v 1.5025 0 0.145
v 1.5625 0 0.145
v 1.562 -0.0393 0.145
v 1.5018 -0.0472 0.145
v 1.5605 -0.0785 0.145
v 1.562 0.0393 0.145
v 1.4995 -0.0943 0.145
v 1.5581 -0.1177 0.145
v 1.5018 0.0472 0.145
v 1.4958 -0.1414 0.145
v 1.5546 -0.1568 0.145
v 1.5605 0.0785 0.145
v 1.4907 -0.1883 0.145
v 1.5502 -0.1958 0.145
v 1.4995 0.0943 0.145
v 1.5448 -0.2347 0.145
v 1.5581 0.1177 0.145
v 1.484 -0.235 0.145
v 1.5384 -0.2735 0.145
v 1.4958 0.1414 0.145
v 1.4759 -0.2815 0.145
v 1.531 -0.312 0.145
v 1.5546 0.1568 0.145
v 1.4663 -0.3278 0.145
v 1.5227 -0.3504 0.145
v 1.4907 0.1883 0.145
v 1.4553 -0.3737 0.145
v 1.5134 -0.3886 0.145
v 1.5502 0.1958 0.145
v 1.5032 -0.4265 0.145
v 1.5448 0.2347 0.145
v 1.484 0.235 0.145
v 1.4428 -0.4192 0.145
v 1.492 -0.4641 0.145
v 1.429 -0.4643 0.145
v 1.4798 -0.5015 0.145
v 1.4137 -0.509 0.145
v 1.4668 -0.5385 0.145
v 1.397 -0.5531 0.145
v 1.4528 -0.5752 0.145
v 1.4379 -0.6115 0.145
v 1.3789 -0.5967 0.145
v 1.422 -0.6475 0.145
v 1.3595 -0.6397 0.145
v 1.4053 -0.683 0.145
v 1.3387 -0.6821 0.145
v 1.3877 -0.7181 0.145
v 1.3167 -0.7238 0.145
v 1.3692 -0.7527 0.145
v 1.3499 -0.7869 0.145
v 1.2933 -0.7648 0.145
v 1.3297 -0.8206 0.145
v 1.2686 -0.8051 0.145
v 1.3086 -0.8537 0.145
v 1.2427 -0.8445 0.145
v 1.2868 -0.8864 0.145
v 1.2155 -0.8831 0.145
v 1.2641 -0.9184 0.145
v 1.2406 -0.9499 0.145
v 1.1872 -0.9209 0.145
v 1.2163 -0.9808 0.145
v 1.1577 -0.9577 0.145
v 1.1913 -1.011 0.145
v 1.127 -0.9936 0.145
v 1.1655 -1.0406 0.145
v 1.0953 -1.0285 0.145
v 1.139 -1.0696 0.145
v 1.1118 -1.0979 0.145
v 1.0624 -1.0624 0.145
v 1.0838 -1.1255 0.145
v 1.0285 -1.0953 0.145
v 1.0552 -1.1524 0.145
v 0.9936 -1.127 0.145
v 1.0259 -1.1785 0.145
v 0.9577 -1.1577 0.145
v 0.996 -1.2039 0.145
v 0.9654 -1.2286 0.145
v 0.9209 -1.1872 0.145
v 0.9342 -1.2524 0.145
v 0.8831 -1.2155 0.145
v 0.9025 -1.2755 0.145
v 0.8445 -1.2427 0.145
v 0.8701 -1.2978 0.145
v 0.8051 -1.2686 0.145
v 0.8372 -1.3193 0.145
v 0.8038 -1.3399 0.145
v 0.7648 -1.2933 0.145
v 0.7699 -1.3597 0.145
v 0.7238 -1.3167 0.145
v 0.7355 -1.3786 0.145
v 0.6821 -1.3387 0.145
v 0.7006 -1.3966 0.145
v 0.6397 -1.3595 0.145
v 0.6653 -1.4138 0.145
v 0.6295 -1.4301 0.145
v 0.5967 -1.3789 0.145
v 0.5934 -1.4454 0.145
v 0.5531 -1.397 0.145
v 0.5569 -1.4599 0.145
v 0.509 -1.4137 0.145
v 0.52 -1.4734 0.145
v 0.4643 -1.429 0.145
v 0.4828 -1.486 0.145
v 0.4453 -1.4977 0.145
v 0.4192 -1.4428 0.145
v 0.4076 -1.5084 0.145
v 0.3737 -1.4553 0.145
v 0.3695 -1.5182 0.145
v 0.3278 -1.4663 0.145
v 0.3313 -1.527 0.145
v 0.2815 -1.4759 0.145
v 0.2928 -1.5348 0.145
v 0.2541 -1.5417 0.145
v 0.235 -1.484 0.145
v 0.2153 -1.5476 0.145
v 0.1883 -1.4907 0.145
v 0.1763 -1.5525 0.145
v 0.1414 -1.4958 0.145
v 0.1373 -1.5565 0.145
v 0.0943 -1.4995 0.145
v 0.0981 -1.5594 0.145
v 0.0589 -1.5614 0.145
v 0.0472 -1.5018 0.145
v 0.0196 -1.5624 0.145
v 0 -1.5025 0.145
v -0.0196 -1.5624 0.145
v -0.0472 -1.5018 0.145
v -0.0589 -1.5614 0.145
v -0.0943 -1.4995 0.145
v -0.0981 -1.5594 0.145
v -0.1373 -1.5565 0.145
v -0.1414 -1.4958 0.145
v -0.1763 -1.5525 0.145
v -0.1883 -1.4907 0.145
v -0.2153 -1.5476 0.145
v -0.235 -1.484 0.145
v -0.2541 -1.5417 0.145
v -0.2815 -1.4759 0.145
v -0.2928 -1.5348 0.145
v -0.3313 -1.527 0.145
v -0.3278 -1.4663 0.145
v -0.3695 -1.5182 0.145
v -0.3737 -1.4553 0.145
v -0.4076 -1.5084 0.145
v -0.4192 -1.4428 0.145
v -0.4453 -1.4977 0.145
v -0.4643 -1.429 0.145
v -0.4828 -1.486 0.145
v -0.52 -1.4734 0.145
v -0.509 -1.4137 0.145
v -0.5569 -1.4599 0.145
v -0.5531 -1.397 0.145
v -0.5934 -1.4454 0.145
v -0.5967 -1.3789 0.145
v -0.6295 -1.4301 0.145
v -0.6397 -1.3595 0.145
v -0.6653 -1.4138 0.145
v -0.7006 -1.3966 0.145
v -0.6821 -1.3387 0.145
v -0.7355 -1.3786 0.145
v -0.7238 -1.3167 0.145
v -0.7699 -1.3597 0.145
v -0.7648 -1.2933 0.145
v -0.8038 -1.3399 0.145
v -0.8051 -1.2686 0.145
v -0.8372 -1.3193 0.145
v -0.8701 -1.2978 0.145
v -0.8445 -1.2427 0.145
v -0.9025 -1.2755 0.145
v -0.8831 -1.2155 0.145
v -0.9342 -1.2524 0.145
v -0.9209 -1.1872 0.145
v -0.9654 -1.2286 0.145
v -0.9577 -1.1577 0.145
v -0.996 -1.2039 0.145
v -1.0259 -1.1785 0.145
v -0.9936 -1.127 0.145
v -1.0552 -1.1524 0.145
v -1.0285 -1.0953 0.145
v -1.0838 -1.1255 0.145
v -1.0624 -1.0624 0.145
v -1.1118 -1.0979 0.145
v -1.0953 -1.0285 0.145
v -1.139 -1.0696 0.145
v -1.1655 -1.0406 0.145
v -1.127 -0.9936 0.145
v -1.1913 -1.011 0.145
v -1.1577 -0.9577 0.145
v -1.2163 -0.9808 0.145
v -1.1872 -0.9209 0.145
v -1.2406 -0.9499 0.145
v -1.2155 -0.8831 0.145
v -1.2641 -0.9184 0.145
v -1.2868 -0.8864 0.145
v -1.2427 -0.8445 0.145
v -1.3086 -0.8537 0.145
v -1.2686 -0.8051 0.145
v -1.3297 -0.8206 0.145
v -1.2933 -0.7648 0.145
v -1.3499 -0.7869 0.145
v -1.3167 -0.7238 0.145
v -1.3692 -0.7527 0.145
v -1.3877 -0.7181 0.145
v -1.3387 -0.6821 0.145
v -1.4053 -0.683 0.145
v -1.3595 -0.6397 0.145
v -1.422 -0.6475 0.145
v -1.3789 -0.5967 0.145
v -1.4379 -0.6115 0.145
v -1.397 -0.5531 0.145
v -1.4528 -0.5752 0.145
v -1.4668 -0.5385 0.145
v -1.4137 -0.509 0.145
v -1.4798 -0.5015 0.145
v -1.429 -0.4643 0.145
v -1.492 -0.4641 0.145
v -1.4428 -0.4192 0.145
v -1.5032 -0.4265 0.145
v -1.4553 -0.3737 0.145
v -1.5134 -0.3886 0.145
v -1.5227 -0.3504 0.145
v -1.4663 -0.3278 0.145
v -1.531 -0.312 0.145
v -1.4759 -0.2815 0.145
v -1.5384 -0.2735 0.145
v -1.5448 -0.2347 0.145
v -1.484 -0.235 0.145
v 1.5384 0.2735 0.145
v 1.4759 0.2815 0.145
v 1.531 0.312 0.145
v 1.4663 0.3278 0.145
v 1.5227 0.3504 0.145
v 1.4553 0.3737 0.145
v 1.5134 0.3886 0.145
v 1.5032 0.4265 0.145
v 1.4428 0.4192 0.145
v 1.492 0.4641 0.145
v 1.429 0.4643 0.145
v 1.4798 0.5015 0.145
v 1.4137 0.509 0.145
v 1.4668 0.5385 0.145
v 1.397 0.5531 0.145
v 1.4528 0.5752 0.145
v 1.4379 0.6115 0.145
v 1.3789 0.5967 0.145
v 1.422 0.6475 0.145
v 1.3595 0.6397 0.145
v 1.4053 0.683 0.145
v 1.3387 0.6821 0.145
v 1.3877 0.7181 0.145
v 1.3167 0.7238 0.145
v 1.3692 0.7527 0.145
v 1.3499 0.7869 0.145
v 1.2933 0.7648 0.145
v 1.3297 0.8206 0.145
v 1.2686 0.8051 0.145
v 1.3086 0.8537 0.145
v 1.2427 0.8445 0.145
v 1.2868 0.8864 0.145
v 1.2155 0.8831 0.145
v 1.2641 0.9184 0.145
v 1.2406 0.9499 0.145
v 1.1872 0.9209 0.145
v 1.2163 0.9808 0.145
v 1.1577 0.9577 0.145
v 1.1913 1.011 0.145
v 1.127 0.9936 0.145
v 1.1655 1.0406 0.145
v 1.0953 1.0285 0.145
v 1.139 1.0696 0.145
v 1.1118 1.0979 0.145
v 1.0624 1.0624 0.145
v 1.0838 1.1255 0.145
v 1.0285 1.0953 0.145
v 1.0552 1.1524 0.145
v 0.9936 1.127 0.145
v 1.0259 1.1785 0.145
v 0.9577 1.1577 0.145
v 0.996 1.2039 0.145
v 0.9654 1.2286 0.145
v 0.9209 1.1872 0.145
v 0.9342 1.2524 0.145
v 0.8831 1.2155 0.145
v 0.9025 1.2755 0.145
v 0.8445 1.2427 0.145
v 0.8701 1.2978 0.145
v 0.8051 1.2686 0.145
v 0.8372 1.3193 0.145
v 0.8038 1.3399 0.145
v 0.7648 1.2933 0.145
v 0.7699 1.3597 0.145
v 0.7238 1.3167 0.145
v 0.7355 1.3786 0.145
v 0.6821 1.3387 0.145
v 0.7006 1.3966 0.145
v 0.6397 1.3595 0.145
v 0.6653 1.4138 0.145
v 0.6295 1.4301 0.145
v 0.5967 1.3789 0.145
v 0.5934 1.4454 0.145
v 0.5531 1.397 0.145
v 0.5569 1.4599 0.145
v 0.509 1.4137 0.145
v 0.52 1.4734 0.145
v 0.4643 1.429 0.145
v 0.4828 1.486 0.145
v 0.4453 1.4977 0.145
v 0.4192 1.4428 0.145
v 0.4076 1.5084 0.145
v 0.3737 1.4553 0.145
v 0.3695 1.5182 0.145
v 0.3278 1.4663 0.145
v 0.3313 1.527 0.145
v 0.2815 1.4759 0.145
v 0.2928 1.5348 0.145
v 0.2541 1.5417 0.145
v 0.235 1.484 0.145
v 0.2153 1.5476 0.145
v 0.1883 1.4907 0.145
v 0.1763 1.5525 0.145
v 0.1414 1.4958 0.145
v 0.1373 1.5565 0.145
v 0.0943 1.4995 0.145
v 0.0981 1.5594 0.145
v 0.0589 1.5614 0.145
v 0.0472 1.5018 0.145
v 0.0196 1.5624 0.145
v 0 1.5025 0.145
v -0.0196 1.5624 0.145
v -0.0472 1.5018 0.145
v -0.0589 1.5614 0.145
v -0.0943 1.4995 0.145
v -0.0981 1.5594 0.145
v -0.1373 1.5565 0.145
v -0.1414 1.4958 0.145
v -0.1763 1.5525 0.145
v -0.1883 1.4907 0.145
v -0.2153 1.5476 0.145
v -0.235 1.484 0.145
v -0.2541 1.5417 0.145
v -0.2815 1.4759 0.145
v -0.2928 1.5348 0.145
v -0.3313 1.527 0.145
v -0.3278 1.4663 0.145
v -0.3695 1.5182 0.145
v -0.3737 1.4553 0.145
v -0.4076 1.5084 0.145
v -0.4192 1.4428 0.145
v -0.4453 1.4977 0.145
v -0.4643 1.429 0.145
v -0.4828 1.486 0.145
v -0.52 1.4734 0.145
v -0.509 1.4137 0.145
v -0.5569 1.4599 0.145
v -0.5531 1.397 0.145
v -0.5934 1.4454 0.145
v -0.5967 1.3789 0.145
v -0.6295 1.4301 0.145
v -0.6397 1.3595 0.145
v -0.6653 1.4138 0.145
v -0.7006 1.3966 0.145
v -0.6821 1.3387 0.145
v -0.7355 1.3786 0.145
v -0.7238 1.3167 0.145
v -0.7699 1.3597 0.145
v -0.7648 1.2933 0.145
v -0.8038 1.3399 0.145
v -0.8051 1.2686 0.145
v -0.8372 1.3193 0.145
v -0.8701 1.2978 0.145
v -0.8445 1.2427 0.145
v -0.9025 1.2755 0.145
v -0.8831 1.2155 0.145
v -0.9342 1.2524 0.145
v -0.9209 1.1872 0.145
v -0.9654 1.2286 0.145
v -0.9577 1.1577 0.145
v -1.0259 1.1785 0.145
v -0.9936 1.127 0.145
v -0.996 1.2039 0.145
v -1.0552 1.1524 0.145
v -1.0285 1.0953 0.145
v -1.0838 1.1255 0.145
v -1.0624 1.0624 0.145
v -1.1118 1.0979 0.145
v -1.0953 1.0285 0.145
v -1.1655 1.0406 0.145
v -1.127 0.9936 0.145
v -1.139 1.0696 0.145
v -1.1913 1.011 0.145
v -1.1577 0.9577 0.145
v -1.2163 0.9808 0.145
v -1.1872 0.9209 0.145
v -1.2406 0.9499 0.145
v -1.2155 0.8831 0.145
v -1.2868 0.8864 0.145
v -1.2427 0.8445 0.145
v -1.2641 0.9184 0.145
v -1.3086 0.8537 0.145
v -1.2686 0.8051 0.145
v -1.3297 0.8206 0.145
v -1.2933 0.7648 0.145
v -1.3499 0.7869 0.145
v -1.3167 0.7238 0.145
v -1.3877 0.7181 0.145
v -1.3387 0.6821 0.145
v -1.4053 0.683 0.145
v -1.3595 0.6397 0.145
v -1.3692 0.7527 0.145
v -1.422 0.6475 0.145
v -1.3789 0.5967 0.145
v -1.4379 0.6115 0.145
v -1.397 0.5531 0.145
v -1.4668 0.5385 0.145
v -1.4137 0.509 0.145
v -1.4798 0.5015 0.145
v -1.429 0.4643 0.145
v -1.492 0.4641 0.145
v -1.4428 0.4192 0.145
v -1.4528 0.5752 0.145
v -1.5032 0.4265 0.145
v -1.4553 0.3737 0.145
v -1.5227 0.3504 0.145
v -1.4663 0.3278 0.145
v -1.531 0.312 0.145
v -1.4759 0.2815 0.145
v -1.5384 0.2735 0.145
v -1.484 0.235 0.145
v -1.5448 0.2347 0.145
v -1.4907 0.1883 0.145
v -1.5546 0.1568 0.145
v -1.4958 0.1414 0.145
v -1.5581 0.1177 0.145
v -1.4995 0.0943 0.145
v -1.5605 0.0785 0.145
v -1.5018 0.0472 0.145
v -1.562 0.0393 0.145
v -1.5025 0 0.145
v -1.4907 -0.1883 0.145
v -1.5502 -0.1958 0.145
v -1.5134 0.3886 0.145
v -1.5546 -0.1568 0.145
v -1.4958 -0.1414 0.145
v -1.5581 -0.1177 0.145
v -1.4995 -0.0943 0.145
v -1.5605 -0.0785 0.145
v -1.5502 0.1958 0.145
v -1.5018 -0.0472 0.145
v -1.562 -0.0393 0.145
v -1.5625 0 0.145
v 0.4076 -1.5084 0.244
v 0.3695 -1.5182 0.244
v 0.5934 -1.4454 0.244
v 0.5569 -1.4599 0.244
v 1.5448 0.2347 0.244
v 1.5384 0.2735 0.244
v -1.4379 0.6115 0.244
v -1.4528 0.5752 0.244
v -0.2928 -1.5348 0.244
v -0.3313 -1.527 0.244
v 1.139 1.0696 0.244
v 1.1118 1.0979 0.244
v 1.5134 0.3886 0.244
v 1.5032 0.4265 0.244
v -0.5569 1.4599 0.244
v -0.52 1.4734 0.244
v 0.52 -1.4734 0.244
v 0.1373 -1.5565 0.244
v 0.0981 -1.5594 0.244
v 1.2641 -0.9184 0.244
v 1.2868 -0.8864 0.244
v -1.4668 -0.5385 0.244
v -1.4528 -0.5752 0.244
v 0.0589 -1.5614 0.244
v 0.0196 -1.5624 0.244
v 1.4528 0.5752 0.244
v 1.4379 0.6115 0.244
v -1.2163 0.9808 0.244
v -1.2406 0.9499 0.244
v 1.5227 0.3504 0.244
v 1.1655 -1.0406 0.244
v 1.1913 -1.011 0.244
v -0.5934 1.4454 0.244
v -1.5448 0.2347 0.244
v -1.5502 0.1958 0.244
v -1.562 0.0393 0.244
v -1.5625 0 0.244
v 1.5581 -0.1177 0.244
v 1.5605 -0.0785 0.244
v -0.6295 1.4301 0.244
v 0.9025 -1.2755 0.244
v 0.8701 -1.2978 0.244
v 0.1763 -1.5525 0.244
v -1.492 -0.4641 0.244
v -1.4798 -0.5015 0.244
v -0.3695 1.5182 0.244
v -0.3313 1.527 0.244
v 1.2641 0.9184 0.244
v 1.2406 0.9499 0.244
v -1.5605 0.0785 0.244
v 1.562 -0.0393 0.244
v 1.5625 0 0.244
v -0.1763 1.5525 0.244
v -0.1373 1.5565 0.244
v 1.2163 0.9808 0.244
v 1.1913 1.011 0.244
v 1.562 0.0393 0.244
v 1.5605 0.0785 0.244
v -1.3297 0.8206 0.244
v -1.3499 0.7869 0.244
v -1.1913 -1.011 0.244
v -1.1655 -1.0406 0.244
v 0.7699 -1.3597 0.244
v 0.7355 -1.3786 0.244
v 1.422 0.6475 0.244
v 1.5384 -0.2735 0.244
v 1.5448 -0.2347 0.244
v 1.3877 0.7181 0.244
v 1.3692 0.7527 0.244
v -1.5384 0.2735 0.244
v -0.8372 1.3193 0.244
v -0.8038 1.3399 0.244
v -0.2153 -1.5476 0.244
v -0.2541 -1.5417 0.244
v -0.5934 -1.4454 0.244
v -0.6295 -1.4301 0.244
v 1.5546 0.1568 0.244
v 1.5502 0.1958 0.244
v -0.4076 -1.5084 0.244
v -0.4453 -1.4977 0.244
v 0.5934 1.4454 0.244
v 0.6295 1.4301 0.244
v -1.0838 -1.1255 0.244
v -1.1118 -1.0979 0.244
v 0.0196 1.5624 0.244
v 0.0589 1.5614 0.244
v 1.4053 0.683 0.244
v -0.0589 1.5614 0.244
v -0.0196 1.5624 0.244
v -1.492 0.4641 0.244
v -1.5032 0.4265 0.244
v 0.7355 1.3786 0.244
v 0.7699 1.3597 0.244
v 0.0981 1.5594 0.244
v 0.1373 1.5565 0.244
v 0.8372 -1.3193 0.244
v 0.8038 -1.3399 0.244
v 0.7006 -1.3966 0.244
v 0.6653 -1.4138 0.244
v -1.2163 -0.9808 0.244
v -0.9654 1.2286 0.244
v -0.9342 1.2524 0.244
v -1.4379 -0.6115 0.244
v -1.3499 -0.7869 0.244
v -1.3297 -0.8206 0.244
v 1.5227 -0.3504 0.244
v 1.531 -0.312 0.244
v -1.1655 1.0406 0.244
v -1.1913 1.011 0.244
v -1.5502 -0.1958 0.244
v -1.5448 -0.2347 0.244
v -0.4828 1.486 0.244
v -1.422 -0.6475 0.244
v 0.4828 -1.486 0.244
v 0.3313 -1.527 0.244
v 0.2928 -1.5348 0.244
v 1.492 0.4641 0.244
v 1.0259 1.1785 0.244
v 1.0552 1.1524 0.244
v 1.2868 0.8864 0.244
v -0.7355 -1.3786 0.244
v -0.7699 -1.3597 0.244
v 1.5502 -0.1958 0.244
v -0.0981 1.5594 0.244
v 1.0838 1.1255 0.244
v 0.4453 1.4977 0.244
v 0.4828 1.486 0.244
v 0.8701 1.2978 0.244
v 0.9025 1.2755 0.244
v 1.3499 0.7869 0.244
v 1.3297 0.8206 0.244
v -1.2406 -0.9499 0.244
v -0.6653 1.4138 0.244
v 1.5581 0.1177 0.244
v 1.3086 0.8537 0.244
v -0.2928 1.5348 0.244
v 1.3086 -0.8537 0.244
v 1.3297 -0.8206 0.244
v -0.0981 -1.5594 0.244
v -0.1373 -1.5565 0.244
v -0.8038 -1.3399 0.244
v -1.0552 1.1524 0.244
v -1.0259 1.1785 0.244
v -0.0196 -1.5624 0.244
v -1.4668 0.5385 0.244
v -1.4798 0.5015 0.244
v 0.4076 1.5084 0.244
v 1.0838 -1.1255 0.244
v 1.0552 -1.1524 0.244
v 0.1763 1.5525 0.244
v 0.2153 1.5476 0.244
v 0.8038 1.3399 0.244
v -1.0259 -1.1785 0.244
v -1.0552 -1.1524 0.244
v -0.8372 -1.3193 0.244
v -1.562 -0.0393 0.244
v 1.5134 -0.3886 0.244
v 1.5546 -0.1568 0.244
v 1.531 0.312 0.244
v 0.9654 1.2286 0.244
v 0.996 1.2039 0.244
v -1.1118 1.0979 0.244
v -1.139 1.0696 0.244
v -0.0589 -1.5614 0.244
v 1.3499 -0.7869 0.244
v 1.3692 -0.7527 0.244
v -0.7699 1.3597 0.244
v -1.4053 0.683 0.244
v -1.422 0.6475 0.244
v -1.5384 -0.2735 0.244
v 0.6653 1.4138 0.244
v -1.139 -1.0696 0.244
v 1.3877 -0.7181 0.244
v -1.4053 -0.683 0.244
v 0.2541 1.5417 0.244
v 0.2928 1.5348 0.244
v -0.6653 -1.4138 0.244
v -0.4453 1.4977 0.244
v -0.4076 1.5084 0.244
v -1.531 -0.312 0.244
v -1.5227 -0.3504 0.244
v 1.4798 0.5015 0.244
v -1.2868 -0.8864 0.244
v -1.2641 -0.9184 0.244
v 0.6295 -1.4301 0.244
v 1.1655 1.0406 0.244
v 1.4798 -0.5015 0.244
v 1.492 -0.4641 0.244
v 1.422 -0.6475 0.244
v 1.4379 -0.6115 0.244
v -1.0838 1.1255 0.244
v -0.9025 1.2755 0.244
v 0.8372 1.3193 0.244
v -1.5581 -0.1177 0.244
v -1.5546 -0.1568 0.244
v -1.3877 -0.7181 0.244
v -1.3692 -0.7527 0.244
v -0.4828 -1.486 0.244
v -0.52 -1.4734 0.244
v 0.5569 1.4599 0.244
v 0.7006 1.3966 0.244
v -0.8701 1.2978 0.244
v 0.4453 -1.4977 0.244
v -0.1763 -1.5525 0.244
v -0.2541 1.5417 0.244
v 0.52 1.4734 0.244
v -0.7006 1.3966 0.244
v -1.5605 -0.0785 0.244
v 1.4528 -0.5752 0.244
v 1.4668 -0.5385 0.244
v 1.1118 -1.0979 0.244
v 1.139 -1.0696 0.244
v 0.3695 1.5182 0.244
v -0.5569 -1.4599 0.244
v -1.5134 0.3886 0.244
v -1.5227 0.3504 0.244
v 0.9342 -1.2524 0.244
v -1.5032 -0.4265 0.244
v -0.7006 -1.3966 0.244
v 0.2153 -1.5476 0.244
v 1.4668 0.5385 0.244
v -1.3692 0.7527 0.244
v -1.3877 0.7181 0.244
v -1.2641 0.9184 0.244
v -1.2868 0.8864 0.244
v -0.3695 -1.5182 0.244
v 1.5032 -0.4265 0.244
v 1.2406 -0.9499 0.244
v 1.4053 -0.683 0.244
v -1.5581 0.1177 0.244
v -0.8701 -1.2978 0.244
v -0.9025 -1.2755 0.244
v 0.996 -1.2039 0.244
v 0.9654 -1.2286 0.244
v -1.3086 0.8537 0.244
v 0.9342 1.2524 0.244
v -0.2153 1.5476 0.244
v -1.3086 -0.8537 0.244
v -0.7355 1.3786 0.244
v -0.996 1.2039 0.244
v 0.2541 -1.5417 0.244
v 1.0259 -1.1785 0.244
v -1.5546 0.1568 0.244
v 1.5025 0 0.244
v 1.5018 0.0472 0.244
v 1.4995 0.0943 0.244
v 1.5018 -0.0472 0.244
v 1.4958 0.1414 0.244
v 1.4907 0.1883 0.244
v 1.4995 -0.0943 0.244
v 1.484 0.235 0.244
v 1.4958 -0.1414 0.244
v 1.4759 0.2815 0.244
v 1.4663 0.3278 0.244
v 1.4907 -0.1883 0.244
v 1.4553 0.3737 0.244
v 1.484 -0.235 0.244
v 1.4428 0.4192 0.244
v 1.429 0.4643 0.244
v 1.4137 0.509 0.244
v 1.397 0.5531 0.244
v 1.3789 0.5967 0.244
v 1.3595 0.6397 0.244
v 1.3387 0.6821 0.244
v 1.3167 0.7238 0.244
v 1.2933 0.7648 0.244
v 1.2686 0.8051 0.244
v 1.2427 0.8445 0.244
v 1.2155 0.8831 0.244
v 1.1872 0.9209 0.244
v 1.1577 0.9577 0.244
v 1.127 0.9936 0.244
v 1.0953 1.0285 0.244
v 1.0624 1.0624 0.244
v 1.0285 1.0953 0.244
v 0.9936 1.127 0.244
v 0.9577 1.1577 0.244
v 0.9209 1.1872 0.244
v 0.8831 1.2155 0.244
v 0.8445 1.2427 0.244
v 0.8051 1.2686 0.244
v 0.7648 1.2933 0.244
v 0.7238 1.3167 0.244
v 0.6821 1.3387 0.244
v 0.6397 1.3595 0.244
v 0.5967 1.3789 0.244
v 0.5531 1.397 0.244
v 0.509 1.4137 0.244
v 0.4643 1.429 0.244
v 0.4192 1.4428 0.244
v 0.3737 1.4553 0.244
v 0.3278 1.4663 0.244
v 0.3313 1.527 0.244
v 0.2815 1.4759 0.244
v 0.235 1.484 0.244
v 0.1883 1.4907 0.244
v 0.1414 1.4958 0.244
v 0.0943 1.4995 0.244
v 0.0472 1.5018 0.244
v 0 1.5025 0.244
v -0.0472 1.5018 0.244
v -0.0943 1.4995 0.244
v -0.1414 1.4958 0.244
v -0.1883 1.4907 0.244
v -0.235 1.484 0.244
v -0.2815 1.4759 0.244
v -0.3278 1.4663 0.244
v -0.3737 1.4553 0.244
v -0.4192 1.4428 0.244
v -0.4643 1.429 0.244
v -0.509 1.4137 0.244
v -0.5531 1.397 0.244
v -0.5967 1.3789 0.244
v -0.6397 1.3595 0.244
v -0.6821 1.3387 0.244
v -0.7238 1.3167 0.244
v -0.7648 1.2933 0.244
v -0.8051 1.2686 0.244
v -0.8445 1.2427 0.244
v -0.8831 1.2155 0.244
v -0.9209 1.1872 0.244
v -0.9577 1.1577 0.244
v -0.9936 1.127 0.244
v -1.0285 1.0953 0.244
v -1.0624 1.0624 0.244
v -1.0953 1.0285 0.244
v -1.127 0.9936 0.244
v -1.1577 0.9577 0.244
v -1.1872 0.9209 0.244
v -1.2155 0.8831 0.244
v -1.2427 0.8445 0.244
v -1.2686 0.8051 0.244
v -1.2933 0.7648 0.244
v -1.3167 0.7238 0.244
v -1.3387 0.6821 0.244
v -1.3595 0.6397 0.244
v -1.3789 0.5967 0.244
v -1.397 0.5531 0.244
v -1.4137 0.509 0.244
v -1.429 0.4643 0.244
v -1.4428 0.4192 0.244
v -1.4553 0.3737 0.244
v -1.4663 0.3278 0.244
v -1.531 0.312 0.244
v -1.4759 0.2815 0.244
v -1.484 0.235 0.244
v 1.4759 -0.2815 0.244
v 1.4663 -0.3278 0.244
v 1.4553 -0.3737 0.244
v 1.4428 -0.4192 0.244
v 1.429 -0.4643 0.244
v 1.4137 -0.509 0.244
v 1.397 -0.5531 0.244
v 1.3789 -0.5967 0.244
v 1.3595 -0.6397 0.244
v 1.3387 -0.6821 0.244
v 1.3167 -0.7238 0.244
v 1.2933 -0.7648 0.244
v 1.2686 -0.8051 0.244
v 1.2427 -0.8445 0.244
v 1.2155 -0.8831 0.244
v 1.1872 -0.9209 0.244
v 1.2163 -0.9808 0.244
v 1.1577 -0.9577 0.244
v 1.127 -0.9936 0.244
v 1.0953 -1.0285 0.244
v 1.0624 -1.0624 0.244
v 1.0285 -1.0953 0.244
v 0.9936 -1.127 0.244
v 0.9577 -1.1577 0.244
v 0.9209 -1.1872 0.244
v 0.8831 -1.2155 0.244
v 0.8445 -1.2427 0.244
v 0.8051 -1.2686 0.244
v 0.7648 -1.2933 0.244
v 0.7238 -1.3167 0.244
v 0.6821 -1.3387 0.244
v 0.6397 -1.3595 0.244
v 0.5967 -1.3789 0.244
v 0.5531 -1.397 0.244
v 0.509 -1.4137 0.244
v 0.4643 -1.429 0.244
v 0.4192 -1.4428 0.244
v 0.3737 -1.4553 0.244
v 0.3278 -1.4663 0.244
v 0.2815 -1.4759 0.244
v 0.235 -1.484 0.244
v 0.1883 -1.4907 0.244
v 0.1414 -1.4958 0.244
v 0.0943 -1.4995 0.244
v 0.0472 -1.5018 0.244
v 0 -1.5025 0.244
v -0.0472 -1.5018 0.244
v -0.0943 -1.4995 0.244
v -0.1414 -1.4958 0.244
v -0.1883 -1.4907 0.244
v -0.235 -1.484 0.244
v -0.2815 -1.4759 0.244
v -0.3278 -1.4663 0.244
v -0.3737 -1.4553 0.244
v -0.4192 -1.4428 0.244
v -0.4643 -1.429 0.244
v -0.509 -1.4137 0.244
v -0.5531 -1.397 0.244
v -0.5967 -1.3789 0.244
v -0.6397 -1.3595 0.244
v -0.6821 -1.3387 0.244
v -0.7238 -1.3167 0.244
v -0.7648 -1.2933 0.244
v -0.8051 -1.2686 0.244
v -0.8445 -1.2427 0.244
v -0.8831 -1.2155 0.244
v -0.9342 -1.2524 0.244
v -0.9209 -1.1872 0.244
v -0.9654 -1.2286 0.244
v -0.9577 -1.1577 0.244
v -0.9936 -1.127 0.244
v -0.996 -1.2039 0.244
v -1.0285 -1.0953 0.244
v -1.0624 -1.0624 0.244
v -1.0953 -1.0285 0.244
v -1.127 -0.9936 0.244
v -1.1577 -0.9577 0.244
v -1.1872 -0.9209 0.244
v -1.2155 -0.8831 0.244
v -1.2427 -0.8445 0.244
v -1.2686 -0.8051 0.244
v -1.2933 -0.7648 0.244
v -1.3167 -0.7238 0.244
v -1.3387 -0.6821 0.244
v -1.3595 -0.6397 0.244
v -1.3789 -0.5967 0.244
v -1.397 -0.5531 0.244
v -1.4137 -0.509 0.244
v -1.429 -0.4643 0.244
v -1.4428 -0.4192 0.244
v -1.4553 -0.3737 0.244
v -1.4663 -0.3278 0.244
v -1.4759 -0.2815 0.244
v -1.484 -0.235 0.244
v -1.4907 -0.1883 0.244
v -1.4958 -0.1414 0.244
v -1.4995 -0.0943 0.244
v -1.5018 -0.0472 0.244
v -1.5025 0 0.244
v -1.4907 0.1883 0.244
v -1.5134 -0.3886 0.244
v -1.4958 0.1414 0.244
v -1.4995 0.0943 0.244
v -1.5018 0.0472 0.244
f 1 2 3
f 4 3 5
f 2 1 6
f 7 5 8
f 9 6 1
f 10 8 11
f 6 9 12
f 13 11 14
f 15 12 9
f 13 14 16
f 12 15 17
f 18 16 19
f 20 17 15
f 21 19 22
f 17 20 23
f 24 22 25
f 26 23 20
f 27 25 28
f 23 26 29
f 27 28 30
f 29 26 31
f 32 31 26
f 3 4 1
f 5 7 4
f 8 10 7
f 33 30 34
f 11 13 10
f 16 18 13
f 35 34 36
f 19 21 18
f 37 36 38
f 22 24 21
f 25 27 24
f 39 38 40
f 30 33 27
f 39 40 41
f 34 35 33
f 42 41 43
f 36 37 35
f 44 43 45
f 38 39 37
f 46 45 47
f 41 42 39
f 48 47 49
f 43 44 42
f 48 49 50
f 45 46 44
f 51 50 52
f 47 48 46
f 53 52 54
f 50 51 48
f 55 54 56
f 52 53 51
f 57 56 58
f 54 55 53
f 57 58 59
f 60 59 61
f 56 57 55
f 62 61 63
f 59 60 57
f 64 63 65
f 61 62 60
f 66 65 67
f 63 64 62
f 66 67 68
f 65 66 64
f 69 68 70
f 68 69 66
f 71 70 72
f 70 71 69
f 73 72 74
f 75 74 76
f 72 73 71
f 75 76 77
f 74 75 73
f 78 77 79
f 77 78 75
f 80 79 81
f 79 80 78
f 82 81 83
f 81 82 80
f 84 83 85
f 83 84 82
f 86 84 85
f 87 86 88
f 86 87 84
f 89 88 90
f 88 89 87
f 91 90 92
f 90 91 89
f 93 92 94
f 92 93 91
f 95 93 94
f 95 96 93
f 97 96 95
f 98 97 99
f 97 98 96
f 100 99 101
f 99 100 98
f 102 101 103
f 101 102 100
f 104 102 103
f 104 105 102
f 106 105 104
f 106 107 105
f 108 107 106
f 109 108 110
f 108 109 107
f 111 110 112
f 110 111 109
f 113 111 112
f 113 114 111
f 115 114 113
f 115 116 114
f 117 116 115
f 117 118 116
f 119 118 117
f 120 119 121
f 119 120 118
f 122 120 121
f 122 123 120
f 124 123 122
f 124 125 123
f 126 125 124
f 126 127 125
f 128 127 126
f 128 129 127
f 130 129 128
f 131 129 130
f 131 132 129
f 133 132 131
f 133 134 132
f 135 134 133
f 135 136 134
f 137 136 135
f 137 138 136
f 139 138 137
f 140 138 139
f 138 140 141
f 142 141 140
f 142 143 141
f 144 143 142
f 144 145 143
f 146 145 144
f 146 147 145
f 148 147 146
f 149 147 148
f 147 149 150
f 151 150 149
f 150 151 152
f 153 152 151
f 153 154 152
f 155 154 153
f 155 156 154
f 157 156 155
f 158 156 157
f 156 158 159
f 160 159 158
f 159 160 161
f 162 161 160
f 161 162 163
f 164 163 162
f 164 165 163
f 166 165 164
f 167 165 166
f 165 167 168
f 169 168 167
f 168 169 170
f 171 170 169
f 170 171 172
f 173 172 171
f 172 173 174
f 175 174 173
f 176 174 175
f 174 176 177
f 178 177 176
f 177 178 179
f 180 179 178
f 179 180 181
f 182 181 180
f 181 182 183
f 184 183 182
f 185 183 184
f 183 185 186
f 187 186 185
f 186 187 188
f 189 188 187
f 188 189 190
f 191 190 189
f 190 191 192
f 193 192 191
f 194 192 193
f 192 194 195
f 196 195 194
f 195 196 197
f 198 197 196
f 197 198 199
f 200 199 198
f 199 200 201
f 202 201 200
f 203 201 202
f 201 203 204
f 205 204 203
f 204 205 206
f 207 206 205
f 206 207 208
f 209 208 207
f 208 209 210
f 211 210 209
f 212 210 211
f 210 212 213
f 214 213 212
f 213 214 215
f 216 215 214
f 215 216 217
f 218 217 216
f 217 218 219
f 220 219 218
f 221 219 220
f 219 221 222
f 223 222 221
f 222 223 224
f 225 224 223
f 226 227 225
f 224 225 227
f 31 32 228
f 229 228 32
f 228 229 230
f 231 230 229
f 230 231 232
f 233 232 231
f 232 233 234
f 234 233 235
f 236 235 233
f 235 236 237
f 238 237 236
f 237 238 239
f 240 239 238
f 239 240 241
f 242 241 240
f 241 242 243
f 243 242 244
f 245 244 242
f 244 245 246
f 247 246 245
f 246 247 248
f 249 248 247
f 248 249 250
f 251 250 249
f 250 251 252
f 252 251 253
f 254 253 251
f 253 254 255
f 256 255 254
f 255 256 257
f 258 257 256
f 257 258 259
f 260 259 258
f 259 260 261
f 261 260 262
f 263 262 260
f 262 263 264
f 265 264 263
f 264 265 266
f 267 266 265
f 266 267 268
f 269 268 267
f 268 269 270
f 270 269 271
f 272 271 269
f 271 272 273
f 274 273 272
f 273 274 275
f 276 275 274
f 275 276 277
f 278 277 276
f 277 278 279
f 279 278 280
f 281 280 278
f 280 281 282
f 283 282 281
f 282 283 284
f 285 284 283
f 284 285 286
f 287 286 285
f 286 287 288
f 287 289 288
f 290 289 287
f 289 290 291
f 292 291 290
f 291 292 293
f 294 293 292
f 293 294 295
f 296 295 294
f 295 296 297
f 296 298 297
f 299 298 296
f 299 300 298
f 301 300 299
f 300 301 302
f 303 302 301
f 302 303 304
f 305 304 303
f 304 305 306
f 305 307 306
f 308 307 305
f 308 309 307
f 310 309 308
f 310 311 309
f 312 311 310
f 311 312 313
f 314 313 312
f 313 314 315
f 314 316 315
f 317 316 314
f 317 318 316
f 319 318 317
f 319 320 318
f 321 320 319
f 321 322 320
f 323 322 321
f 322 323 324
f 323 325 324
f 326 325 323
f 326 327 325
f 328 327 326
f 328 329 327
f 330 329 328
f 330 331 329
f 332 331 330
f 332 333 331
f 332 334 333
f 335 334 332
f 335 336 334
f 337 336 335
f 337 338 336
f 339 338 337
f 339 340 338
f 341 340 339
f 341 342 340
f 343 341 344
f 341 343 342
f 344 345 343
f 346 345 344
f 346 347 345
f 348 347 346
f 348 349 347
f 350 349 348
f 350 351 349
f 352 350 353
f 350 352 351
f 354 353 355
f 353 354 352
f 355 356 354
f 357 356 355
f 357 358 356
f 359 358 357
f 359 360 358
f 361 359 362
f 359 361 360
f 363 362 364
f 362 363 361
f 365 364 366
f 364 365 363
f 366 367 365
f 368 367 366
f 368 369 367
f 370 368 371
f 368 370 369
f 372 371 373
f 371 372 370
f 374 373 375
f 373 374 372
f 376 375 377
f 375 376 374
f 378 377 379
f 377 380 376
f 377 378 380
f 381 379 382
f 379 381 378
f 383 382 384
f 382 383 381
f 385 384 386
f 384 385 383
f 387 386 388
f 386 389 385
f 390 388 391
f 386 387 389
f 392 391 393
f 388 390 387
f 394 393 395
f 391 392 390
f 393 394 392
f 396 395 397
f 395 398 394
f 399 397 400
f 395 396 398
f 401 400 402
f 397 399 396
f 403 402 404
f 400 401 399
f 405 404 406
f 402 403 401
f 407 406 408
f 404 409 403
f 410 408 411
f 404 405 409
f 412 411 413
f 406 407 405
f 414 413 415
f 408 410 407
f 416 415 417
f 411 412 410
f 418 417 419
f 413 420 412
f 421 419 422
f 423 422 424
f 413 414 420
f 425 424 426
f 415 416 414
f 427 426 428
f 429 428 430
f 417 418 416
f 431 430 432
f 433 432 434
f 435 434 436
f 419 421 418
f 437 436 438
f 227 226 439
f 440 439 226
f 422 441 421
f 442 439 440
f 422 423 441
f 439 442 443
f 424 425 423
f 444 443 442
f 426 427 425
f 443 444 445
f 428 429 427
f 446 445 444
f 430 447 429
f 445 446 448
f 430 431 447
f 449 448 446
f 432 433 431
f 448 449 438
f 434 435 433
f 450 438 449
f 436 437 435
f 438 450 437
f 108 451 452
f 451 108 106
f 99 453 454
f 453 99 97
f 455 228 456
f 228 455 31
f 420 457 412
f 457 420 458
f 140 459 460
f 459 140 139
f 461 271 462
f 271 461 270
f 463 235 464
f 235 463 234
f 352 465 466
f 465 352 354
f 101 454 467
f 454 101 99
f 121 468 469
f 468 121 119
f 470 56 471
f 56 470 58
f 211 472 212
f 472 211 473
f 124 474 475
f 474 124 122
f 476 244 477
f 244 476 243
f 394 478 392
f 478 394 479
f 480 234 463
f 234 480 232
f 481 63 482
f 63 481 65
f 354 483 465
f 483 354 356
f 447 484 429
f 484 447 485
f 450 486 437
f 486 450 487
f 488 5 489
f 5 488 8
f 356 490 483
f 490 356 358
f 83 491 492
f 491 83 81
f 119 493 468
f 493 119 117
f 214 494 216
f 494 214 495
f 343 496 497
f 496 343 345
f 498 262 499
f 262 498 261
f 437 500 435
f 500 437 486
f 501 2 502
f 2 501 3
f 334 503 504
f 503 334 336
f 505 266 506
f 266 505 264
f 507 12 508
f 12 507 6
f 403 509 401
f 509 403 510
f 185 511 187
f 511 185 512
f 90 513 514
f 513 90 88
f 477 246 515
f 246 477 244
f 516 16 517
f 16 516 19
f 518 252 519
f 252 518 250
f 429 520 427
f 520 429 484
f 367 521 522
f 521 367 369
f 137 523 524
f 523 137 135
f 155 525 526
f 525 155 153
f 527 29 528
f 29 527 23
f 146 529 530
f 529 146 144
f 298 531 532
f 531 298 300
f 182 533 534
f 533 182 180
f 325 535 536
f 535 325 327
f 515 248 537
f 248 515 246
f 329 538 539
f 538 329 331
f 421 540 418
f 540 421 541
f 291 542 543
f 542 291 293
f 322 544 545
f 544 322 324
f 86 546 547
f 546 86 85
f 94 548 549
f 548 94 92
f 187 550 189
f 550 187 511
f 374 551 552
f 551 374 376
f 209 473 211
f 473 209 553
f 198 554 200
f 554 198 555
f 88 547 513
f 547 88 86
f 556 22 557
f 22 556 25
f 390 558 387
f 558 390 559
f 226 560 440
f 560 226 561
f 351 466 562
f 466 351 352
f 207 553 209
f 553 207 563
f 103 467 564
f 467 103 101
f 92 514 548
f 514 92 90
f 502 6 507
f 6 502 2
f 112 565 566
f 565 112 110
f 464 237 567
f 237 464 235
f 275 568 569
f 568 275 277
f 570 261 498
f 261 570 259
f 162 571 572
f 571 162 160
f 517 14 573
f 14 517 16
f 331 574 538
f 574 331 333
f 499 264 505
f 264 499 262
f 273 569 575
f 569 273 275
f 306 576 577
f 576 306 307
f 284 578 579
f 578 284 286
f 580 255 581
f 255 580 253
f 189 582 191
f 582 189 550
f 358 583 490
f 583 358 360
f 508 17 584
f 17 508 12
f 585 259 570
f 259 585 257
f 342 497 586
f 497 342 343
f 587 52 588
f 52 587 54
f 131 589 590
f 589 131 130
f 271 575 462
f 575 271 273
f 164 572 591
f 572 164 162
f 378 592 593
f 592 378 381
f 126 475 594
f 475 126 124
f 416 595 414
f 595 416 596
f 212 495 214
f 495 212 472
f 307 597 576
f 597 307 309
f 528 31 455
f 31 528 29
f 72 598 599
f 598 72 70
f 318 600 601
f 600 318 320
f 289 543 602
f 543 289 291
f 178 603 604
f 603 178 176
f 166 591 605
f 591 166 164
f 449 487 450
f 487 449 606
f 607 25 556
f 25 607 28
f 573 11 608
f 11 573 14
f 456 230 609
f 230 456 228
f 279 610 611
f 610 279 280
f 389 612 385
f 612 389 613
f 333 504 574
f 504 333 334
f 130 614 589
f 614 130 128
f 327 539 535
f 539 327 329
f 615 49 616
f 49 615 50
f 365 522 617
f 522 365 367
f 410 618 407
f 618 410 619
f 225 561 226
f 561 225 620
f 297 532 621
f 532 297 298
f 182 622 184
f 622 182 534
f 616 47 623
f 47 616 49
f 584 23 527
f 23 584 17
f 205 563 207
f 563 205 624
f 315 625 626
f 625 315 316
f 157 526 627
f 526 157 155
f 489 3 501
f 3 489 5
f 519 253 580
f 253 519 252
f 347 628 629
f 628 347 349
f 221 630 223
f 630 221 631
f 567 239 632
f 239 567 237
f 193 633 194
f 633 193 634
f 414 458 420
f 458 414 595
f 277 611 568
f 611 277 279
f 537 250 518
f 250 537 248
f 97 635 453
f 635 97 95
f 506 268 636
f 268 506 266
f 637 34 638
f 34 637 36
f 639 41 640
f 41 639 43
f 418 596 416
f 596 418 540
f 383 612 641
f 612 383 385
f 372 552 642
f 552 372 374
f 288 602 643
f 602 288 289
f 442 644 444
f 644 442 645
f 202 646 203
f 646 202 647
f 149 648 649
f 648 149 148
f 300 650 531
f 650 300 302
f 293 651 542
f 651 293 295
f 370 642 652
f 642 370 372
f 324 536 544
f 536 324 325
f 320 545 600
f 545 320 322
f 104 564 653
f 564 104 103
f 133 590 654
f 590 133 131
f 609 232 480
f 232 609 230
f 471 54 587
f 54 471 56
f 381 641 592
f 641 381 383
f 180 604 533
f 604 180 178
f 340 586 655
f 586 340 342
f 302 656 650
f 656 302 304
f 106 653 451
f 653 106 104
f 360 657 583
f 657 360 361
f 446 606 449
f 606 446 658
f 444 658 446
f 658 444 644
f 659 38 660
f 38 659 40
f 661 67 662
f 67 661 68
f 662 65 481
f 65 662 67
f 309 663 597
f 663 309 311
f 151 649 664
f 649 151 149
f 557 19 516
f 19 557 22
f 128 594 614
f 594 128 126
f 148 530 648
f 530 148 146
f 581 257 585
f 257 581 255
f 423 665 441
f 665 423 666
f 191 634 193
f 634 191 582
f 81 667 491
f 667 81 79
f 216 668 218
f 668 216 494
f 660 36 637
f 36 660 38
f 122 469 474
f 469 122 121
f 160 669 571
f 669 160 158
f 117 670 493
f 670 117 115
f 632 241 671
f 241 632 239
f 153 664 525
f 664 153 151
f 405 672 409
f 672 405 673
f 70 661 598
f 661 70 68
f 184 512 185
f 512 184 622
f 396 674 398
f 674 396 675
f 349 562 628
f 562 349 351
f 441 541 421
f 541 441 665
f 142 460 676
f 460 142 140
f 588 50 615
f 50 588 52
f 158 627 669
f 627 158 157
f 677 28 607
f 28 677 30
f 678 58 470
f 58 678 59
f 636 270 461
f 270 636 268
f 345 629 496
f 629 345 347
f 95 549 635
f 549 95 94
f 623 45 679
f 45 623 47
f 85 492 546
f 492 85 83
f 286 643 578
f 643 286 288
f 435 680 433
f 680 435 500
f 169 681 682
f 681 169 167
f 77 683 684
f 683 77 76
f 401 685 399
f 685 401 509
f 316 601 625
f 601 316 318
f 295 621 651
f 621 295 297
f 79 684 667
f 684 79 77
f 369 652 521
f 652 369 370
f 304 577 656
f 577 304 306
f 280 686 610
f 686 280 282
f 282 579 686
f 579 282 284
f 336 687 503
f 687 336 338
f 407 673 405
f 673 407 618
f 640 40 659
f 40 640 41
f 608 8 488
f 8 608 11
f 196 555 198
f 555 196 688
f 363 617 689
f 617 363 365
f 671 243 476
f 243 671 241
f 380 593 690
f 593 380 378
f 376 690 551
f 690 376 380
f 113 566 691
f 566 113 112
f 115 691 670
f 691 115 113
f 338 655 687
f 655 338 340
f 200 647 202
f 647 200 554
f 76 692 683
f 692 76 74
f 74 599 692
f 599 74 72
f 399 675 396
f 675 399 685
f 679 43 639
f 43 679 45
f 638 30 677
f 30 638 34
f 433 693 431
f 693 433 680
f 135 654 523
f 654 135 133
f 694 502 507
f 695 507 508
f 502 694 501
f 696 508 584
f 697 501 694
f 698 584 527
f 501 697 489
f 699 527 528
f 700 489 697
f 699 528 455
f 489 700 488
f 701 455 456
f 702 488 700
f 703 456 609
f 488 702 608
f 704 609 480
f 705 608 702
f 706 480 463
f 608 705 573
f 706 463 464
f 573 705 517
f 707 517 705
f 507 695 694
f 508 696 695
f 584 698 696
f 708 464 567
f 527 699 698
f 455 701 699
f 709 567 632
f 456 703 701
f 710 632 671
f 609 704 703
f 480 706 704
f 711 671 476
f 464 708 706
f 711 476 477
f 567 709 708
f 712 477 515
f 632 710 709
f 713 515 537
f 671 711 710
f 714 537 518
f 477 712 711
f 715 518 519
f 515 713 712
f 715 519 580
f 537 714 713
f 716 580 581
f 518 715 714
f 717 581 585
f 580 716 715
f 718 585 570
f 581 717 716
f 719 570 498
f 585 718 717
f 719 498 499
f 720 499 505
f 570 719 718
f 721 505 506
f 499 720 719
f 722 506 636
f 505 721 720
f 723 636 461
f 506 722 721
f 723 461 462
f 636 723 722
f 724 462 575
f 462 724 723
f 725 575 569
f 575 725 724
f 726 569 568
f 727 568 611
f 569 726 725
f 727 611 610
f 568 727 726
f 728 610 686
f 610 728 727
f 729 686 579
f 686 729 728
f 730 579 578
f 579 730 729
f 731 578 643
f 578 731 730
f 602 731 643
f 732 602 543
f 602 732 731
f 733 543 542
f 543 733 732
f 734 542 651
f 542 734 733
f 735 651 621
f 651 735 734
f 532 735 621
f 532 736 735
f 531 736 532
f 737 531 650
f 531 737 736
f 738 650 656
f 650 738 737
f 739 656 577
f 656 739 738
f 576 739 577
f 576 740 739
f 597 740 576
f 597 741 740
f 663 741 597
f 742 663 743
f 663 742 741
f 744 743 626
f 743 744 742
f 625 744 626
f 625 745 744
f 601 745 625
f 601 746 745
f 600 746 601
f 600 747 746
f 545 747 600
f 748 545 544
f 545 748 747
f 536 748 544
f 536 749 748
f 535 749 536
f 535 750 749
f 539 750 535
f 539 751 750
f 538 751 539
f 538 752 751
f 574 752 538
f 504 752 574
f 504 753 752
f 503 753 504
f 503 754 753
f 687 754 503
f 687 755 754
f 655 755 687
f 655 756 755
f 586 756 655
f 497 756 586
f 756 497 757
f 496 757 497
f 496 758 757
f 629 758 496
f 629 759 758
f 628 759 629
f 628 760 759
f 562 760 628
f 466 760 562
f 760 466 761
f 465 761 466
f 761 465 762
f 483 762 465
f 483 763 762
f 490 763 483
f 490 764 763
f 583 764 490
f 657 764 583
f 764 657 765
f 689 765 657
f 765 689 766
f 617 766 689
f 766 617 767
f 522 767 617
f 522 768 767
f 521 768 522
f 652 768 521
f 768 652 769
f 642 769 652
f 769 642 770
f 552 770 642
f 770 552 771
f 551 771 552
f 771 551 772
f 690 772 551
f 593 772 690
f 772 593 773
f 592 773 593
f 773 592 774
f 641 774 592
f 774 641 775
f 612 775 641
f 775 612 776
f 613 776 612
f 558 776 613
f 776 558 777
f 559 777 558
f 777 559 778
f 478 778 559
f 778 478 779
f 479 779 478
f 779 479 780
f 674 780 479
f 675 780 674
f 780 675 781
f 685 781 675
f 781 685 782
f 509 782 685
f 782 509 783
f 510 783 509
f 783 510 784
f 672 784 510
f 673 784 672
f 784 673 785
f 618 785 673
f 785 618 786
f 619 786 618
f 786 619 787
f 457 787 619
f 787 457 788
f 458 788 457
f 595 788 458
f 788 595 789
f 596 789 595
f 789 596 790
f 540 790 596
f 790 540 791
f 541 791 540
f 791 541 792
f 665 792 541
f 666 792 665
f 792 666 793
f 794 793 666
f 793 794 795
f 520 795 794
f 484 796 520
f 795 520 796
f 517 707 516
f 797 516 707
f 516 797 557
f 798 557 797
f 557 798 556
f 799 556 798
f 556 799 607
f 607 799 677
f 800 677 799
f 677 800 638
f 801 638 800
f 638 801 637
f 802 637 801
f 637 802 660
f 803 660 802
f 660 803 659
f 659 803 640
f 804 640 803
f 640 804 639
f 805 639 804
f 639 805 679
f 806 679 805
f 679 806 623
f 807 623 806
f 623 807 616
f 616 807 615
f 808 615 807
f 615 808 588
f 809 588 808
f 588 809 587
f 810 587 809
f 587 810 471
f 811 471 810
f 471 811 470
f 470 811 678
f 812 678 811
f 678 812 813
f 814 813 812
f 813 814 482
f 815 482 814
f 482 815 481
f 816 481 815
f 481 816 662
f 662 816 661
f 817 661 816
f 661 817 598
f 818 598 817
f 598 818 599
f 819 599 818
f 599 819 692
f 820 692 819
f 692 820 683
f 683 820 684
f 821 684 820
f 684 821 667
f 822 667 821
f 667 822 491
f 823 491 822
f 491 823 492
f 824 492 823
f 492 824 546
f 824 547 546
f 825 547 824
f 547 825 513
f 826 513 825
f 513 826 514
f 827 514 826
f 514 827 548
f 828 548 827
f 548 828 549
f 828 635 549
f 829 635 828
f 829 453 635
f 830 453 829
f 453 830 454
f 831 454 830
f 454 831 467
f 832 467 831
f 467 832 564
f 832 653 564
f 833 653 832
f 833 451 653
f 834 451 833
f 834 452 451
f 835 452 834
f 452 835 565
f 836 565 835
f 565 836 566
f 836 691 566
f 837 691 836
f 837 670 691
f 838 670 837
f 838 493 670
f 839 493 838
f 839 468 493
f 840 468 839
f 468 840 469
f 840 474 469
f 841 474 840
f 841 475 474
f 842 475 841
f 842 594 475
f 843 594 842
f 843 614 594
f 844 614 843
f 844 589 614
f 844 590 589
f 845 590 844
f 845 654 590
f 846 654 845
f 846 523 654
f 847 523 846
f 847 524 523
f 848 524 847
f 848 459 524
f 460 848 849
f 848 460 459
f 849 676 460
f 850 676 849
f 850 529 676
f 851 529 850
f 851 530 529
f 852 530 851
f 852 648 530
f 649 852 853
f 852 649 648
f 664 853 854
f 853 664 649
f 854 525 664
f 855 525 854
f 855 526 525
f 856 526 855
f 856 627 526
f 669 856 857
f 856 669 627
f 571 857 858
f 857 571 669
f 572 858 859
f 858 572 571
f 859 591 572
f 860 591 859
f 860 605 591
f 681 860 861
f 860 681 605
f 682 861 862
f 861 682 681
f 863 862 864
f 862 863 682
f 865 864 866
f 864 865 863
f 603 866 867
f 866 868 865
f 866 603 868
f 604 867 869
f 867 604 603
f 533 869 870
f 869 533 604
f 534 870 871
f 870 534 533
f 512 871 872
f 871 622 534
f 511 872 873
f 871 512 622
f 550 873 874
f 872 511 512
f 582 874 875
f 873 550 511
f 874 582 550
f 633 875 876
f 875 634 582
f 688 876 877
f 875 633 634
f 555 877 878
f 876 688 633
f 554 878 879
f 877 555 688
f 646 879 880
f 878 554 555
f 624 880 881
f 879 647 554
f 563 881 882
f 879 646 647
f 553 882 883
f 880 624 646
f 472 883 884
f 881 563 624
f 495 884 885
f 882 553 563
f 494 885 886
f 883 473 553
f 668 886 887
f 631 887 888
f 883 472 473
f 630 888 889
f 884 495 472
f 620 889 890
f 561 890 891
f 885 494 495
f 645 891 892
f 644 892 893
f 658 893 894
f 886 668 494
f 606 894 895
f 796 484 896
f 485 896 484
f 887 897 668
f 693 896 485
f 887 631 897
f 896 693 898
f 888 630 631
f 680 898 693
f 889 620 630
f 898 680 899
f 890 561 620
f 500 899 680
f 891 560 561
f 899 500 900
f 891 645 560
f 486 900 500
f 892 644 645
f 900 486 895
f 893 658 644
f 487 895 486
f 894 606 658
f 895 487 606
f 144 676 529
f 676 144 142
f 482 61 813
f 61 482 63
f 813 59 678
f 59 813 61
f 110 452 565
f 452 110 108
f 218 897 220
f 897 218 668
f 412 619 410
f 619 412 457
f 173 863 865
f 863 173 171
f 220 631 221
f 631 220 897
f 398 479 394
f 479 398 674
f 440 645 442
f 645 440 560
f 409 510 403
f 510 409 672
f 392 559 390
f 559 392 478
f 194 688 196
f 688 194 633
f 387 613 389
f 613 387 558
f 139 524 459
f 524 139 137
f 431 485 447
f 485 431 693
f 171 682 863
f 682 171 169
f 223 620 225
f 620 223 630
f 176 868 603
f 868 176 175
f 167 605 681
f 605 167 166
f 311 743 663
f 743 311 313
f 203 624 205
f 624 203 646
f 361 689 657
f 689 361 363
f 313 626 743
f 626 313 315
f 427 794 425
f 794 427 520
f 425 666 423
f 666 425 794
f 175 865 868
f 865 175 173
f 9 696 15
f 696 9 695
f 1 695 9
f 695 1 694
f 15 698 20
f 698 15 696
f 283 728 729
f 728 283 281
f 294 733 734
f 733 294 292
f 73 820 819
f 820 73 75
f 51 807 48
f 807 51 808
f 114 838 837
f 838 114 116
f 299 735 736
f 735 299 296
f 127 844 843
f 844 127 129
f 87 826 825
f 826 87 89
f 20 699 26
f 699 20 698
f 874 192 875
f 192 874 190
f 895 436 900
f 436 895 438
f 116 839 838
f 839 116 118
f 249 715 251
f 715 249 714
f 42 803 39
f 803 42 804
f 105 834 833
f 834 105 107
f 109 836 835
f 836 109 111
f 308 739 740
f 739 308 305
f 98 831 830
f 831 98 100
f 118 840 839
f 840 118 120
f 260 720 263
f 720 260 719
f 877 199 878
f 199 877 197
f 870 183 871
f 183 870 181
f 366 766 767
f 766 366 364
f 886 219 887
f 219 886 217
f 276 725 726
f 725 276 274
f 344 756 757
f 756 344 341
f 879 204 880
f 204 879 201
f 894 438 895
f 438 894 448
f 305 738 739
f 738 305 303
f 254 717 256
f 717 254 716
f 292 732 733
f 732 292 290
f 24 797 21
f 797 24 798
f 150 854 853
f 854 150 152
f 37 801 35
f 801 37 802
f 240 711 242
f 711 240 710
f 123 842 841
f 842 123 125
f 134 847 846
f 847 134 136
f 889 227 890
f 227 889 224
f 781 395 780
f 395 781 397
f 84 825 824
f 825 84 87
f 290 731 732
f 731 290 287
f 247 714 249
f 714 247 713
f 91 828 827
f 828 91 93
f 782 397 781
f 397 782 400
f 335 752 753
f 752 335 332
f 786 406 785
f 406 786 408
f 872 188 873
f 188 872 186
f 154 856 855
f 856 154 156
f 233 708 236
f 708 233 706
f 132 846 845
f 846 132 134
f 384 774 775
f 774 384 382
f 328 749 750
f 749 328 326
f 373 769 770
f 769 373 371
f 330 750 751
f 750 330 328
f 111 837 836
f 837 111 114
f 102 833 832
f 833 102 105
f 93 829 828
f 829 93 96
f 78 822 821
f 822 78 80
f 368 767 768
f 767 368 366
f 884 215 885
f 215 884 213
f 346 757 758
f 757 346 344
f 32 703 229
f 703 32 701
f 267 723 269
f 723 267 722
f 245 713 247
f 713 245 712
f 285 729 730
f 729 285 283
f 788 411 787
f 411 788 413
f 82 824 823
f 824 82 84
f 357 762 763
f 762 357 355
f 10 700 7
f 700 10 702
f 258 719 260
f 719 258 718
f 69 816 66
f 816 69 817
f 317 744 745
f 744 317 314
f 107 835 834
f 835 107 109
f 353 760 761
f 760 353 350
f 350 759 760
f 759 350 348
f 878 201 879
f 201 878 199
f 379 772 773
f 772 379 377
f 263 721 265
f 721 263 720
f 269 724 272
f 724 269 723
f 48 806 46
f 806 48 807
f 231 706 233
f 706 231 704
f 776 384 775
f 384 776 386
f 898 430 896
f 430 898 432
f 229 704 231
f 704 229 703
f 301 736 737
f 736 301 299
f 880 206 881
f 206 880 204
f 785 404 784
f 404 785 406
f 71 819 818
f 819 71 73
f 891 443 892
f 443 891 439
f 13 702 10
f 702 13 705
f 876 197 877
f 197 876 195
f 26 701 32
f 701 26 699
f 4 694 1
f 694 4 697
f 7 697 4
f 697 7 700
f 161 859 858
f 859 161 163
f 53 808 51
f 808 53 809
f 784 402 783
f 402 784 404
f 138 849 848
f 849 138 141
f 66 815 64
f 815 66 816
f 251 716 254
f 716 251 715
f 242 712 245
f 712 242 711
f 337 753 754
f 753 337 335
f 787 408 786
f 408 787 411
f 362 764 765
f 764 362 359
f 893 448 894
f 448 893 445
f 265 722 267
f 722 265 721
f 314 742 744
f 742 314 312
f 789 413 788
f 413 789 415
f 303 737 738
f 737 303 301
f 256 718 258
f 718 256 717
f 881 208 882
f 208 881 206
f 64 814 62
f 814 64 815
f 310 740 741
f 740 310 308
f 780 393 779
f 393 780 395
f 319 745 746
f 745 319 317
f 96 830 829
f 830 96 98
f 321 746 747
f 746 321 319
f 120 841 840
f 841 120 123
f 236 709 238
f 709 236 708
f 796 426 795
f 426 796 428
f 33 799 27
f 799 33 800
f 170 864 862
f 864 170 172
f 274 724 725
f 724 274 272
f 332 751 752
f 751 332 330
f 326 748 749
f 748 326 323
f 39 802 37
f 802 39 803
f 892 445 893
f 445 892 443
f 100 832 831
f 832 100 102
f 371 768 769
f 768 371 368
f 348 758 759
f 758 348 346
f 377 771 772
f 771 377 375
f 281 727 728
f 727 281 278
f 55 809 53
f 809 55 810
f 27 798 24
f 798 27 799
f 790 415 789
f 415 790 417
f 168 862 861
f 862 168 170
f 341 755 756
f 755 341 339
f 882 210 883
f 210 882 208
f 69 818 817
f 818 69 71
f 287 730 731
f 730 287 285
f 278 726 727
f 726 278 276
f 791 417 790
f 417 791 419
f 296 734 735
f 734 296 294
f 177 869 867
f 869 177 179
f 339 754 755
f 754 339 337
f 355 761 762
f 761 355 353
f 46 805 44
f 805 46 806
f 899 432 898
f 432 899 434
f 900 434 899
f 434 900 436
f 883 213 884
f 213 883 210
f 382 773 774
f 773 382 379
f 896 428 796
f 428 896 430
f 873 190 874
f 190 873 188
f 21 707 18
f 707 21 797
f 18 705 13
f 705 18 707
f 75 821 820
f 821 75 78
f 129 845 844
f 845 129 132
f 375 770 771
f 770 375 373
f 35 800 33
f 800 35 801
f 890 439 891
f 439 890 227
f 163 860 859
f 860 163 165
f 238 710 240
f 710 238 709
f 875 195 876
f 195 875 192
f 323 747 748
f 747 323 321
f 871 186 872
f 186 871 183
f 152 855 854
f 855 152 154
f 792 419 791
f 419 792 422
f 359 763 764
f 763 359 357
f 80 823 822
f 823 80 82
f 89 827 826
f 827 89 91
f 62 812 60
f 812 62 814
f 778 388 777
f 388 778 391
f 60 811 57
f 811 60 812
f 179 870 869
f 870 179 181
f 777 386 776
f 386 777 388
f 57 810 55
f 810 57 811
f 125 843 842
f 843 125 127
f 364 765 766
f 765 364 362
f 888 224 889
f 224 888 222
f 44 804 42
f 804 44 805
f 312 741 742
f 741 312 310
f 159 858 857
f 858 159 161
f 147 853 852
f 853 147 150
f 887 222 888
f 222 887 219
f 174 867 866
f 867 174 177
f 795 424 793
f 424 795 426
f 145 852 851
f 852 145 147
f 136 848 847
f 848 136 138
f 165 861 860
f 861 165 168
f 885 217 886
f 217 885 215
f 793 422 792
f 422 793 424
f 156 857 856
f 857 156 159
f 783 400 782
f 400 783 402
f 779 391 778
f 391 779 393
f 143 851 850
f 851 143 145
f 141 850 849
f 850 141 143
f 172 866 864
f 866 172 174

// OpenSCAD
deckHeight = 0.150;

module HexNut440(x, y, rot)
{
  translate([x, y, 0 - 0.020])
    rotate(a = rot, v = [0, 0, 1])
      union() {
        cylinder(h = 0.075 + 0.025, d = 0.200 * 1.15, center = false, $fn = 6);
        cylinder(h = 0.275, d = 0.125, center = true, $fn = 100);
      }
}

module AlignmentPin(rot)
{
  rotate(a = rot, v=[0,0,1])
    translate([1.6, 0, -0.020])
      cylinder(h = 0.120, d = 0.135, center = false, $fn = 100);
}

union() {
  difference() {
    linear_extrude(height = deckHeight, center = false, convexity = 10, slices = 10)
       import(file = "FlangeAOutline2.dxf");

    // cut center hole
    cylinder (h = 1.0, d=2.850, center=true, $fn = 250);

    // cut panel mounting holes
    translate([1.25, 1.25, 0])
       cylinder(h = 1.0, d = 0.188, center = true, $fn = 40);
    translate([-1.25, 1.25, 0])
       cylinder(h = 1.0, d = 0.188, center = true, $fn = 40);
    translate([1.25, -1.25, 0])
       cylinder(h = 1.0, d = 0.188, center = true, $fn = 40);
    translate([-1.25, -1.25, 0])
       cylinder(h = 1.0, d = 0.188, center = true, $fn = 40);

    // assembly nuts
    HexNut440( 1,       2.75/2,   37);
    HexNut440(-1,       2.75/2,  -37);
    HexNut440( 1,      -2.75/2,   27);
    HexNut440(-1,      -2.75/2,  -27);
    HexNut440( 2.75/2,  1.000,    -7);
    HexNut440(-2.75/2,  1.000,     7);
    HexNut440( 2.75/2, -1.000,     7);
    HexNut440(-2.75/2, -1.000,    -7);

    // Alignment pins
    AlignmentPin(25);
    AlignmentPin(65);
    AlignmentPin(25 + 90);
    AlignmentPin(65 + 90);
    AlignmentPin(25+ 180);
    AlignmentPin(65 + 180);
    AlignmentPin(25 + 270);
    AlignmentPin(65+ 270);
  }

  // rim for bezel glass
  translate([0, 0, deckHeight - 0.005])
    difference() {
      cylinder (h = 0.188/2 + 0.005, d=3.125, center = false, $fn = 250);
      cylinder (h = 1.0, d=3.005, center = true, $fn = 200);
  }

}
